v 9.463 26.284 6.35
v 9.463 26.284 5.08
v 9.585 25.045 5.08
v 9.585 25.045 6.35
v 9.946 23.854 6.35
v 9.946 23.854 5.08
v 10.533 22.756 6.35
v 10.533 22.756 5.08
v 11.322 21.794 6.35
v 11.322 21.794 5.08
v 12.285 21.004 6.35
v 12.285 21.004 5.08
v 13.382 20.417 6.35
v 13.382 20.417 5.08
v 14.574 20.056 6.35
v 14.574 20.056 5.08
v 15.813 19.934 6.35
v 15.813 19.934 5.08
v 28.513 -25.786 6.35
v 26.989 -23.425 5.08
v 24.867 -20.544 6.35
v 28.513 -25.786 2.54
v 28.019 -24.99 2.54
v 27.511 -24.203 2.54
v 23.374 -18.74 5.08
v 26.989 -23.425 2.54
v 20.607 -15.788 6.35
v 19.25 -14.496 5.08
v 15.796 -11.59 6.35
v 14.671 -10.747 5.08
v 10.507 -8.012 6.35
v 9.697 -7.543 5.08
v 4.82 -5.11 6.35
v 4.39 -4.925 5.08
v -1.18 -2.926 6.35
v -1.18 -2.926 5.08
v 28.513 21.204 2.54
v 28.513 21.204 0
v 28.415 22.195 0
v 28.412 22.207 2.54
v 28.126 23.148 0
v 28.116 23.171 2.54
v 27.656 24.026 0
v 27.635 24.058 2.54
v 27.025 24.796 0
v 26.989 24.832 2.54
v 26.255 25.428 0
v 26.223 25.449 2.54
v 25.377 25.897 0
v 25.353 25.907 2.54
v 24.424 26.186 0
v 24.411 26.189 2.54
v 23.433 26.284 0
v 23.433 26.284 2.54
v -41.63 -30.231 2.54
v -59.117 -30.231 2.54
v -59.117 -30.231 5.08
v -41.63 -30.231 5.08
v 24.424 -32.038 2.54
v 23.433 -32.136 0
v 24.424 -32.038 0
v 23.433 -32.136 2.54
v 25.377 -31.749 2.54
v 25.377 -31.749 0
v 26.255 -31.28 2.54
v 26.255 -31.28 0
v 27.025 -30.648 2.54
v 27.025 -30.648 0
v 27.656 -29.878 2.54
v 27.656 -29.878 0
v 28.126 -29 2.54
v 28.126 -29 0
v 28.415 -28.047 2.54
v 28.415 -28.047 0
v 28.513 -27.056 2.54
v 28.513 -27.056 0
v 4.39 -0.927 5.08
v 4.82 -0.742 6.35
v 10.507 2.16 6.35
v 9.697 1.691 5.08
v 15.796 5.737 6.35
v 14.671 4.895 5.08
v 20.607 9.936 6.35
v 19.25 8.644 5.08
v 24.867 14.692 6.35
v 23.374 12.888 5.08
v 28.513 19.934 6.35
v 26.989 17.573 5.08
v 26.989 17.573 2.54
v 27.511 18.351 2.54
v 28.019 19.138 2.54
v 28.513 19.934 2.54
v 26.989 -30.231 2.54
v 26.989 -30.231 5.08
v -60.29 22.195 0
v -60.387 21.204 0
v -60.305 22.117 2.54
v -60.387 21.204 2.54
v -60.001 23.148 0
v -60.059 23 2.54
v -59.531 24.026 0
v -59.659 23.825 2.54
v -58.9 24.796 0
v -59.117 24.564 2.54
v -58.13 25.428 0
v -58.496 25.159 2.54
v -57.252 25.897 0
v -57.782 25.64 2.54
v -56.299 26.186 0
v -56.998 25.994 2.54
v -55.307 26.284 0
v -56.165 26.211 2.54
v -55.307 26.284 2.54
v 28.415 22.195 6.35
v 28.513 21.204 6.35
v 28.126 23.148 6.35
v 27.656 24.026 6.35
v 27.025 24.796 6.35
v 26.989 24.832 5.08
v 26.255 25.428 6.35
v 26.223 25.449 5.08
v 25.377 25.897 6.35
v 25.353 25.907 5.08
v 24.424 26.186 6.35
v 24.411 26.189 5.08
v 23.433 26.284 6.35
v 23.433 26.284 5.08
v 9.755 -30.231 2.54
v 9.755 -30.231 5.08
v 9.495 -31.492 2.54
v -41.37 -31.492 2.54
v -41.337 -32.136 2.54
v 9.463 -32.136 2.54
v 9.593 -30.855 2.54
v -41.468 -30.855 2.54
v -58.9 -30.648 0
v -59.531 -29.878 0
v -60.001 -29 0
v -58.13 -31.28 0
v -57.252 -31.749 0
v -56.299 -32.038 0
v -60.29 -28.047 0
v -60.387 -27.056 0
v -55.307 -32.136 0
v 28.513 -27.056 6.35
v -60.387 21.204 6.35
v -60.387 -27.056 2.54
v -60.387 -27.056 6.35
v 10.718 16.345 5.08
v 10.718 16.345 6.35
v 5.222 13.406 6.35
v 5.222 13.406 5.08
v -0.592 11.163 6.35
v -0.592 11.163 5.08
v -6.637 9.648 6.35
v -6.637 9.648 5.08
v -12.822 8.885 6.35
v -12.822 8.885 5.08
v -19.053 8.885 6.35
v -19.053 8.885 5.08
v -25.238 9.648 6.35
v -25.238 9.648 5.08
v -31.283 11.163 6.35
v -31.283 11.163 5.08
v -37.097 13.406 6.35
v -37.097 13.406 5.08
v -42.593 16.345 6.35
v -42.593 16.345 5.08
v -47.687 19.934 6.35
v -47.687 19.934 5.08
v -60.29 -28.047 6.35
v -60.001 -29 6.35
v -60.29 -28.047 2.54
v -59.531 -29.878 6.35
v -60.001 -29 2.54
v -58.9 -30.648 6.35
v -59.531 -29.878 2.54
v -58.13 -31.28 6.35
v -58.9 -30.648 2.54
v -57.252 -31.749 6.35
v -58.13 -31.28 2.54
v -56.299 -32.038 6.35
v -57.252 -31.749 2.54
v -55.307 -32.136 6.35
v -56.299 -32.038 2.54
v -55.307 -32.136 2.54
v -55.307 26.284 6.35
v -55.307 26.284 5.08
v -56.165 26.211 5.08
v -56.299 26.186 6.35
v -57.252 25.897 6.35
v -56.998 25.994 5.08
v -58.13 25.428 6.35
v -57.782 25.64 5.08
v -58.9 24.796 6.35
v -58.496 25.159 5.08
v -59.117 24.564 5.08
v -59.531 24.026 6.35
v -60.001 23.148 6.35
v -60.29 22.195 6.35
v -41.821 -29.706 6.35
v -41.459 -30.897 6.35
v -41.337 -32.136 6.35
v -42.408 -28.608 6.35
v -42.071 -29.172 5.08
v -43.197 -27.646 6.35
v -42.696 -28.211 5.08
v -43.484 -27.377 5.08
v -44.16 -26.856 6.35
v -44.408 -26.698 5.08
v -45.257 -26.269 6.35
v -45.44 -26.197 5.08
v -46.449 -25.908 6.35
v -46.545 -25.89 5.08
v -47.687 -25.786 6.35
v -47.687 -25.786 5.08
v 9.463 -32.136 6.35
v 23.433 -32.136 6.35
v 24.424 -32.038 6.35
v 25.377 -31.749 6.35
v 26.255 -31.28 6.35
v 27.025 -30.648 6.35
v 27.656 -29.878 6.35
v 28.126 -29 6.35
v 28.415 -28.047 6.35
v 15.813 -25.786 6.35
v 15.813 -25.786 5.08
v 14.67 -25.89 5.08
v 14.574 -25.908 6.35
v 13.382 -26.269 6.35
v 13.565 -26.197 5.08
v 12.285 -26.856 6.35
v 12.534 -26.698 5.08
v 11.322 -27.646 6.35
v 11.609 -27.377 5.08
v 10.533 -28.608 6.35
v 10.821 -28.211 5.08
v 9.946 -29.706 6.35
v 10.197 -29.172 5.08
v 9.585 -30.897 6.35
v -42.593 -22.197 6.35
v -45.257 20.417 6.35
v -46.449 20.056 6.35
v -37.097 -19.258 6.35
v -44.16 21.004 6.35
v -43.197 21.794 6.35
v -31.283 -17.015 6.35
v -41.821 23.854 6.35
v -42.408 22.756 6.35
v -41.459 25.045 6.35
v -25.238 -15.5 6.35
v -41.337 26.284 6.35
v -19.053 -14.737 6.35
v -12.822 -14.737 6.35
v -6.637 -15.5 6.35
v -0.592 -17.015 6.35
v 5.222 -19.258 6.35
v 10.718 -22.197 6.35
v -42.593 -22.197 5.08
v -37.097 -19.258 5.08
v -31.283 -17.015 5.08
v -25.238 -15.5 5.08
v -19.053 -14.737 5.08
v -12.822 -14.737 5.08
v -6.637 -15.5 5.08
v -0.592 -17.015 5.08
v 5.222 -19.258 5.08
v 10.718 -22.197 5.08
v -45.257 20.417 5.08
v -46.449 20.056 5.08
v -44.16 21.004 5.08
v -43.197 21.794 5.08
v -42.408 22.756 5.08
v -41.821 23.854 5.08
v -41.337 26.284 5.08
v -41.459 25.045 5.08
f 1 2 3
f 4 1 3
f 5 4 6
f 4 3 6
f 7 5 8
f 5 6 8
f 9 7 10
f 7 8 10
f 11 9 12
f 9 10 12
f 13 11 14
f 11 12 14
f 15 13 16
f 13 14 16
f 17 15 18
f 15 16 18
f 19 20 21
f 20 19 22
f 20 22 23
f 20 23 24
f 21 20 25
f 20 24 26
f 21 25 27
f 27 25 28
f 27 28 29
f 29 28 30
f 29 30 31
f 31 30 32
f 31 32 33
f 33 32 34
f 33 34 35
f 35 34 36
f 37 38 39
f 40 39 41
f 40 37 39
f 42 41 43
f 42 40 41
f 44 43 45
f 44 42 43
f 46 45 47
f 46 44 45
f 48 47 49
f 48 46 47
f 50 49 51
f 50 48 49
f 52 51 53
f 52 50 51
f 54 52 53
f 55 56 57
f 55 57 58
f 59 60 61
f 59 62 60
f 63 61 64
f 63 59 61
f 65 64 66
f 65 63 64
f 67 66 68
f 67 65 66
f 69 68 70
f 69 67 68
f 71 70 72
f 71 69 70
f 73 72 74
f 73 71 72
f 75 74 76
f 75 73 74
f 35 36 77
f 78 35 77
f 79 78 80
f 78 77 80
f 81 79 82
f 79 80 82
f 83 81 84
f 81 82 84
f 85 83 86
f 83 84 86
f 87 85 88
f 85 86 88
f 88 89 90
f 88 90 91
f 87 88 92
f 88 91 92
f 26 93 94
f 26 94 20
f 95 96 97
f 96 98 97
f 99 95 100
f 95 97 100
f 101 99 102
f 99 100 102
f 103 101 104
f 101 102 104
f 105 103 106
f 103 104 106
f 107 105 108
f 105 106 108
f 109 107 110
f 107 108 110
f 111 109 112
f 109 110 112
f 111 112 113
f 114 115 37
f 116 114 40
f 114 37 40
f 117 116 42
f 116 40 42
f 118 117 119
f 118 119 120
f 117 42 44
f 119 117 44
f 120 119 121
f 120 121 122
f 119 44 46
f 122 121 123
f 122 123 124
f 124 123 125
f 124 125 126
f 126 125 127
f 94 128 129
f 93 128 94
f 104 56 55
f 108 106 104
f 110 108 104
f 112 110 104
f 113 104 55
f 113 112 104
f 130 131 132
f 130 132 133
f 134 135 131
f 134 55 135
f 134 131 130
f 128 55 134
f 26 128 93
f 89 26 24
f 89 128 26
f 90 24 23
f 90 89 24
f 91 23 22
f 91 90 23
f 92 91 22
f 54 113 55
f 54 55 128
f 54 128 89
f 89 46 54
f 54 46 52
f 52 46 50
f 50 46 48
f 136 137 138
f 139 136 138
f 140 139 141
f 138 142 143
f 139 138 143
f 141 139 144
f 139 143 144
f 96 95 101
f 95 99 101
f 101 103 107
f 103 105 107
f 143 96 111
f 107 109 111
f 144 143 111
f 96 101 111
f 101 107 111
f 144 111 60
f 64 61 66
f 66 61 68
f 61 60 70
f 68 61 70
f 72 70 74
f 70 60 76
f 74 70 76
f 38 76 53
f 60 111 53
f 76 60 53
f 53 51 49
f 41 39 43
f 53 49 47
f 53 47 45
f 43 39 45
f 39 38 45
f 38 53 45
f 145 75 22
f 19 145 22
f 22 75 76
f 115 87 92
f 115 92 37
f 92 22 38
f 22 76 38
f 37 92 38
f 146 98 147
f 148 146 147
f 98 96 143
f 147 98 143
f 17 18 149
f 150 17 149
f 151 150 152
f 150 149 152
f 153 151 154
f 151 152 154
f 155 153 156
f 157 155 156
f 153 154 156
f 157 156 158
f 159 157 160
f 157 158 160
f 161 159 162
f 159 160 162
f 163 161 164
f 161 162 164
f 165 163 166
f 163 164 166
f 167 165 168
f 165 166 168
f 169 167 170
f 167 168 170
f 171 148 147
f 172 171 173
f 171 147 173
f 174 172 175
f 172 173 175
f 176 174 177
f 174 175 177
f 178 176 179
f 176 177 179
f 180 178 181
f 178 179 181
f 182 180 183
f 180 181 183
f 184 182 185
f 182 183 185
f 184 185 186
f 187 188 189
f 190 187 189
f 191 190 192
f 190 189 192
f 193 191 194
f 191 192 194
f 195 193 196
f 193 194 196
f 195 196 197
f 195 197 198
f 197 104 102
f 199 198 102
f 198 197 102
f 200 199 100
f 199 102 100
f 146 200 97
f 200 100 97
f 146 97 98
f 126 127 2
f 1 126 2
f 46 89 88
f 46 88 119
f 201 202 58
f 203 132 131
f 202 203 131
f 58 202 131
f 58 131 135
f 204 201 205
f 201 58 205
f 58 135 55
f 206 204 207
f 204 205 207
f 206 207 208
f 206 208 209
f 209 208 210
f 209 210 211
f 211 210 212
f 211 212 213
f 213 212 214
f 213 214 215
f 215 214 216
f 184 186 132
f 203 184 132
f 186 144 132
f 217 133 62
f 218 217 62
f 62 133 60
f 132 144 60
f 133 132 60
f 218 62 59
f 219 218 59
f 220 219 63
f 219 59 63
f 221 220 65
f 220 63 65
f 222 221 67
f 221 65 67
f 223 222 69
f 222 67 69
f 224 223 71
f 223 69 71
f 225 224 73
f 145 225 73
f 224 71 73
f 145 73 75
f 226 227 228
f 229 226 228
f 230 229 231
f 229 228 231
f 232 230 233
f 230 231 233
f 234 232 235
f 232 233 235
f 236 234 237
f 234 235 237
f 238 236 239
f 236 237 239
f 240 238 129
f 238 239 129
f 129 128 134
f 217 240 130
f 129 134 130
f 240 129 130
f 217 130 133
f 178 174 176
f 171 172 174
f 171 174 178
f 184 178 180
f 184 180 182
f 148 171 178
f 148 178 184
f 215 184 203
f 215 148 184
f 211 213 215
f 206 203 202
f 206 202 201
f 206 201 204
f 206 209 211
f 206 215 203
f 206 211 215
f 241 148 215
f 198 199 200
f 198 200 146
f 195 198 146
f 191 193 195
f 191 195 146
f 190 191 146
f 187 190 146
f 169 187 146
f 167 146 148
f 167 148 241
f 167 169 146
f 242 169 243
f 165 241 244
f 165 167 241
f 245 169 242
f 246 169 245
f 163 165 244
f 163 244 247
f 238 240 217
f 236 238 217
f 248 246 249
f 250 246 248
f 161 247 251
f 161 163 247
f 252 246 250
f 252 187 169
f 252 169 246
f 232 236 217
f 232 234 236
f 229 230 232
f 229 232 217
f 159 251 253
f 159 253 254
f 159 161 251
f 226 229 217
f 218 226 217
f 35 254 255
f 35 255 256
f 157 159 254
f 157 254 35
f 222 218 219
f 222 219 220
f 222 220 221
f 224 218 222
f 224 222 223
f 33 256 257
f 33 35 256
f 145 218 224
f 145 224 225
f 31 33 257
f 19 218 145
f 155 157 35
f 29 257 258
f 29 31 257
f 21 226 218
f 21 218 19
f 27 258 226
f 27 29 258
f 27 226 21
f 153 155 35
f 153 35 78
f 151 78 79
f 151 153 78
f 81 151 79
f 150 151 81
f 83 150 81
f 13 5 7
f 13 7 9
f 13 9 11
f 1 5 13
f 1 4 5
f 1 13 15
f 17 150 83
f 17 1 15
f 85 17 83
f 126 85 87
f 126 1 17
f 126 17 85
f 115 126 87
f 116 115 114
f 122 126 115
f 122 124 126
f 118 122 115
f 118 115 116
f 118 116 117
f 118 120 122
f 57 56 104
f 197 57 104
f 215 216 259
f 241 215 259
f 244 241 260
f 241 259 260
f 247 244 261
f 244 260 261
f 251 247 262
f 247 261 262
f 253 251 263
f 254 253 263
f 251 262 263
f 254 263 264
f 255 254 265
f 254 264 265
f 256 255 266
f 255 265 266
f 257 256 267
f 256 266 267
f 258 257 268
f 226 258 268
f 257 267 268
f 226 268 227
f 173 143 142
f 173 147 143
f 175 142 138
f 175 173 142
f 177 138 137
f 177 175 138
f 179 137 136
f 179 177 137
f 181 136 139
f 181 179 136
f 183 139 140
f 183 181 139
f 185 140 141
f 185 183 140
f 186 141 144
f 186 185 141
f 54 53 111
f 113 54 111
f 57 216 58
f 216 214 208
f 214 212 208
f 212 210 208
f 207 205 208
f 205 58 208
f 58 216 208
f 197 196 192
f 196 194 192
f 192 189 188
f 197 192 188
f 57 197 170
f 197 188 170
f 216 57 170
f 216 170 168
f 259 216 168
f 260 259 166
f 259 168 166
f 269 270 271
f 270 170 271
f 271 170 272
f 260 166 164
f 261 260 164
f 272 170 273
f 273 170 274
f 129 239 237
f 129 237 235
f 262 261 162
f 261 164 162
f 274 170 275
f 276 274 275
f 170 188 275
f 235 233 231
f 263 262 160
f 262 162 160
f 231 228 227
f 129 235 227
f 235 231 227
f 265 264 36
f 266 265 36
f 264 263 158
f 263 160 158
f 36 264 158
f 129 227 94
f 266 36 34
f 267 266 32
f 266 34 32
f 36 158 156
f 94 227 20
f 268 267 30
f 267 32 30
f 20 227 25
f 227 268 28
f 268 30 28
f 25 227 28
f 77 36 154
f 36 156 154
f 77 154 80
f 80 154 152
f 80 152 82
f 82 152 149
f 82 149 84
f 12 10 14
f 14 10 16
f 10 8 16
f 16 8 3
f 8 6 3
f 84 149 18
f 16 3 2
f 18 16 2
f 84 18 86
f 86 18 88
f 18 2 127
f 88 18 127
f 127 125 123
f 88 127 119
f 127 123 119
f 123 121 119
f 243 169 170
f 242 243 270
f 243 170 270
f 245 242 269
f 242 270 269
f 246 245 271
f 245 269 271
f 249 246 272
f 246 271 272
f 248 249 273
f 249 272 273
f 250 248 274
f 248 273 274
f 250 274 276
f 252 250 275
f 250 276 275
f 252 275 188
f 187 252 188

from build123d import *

# Parameters (mm, degrees)
F0_W     = 88.9
F0_H     = 58.42
F1_DEPTH = 2.54
F2_R     = 5.08
F4_DEPTH = 3.81
F5_W     = 86.106
F5_H     = 63.5
F6_DEPTH = 2.54


with BuildPart() as f1:
    # F0 (on Top) → F1 (new body)
    with BuildSketch(Plane.XY):
        with Locations((-15.937483, -2.926046)):
            Rectangle(F0_W, F0_H)
    extrude(amount=F1_DEPTH)

    # F2
    f2_edges = [f1.edges().sort_by_distance(p)[0] for p in [
        (-60.387483, 26.283954, 1.27),
        (-60.387483, -32.136046, 1.27),
        (28.512517, -32.136046, 1.27),
        (28.512517, 26.283954, 1.27),
    ]]
    fillet(f2_edges, radius=F2_R)

    # F3 (on face) → F4 (join)
    with BuildSketch(Plane.XY.offset(2.54)):
        with BuildLine():
            ThreePointArc((-55.307483, 26.283954), (-58.899585, 24.796056), (-60.387483, 21.203954))
            Line((-60.387483, 21.203954), (-60.387483, 19.933954))
            ThreePointArc((-60.387483, 19.933954), (-47.671274, 5.737441), (-30.695205, -2.926046))
            ThreePointArc((-30.695205, -2.926046), (-47.671274, -11.589534), (-60.387483, -25.786046))
            Line((-60.387483, -25.786046), (-60.387483, -27.056046))
            ThreePointArc((-60.387483, -27.056046), (-58.899585, -30.648149), (-55.307483, -32.136046))
            Line((-55.307483, -32.136046), (-41.337483, -32.136046))
            ThreePointArc((-41.337483, -32.136046), (-43.197355, -27.645918), (-47.687483, -25.786046))
            ThreePointArc((-47.687483, -25.786046), (-15.937483, -14.641784), (15.812517, -25.786046))
            ThreePointArc((15.812517, -25.786046), (11.322389, -27.645918), (9.462517, -32.136046))
            Line((9.462517, -32.136046), (23.432517, -32.136046))
            ThreePointArc((23.432517, -32.136046), (27.02462, -30.648149), (28.512517, -27.056046))
            Line((28.512517, -27.056046), (28.512517, -25.786046))
            ThreePointArc((28.512517, -25.786046), (15.796308, -11.589534), (-1.17976, -2.926046))
            ThreePointArc((-1.17976, -2.926046), (15.796308, 5.737441), (28.512517, 19.933954))
            Line((28.512517, 19.933954), (28.512517, 21.203954))
            ThreePointArc((28.512517, 21.203954), (27.02462, 24.796056), (23.432517, 26.283954))
            Line((23.432517, 26.283954), (9.462517, 26.283954))
            ThreePointArc((9.462517, 26.283954), (11.322389, 21.793825), (15.812517, 19.933954))
            ThreePointArc((15.812517, 19.933954), (-15.937483, 8.789691), (-47.687483, 19.933954))
            ThreePointArc((-47.687483, 19.933954), (-43.197355, 21.793825), (-41.337483, 26.283954))
            Line((-41.337483, 26.283954), (-55.307483, 26.283954))
        make_face()
        with BuildLine():
            ThreePointArc((-30.695205, -2.926046), (-47.671274, 5.737441), (-60.387483, 19.933954))
            Line((-60.387483, 19.933954), (-60.387483, -25.786046))
            ThreePointArc((-60.387483, -25.786046), (-47.671274, -11.589534), (-30.695205, -2.926046))
        make_face()
    extrude(amount=F4_DEPTH)

    # F5 (on face) → F6 (cut)
    with BuildSketch(Plane.XY.offset(2.54)):
        with Locations((-16.064483, 1.518954)):
            Rectangle(F5_W, F5_H)
    extrude(amount=F6_DEPTH, mode=Mode.SUBTRACT)


solid = f1.part
